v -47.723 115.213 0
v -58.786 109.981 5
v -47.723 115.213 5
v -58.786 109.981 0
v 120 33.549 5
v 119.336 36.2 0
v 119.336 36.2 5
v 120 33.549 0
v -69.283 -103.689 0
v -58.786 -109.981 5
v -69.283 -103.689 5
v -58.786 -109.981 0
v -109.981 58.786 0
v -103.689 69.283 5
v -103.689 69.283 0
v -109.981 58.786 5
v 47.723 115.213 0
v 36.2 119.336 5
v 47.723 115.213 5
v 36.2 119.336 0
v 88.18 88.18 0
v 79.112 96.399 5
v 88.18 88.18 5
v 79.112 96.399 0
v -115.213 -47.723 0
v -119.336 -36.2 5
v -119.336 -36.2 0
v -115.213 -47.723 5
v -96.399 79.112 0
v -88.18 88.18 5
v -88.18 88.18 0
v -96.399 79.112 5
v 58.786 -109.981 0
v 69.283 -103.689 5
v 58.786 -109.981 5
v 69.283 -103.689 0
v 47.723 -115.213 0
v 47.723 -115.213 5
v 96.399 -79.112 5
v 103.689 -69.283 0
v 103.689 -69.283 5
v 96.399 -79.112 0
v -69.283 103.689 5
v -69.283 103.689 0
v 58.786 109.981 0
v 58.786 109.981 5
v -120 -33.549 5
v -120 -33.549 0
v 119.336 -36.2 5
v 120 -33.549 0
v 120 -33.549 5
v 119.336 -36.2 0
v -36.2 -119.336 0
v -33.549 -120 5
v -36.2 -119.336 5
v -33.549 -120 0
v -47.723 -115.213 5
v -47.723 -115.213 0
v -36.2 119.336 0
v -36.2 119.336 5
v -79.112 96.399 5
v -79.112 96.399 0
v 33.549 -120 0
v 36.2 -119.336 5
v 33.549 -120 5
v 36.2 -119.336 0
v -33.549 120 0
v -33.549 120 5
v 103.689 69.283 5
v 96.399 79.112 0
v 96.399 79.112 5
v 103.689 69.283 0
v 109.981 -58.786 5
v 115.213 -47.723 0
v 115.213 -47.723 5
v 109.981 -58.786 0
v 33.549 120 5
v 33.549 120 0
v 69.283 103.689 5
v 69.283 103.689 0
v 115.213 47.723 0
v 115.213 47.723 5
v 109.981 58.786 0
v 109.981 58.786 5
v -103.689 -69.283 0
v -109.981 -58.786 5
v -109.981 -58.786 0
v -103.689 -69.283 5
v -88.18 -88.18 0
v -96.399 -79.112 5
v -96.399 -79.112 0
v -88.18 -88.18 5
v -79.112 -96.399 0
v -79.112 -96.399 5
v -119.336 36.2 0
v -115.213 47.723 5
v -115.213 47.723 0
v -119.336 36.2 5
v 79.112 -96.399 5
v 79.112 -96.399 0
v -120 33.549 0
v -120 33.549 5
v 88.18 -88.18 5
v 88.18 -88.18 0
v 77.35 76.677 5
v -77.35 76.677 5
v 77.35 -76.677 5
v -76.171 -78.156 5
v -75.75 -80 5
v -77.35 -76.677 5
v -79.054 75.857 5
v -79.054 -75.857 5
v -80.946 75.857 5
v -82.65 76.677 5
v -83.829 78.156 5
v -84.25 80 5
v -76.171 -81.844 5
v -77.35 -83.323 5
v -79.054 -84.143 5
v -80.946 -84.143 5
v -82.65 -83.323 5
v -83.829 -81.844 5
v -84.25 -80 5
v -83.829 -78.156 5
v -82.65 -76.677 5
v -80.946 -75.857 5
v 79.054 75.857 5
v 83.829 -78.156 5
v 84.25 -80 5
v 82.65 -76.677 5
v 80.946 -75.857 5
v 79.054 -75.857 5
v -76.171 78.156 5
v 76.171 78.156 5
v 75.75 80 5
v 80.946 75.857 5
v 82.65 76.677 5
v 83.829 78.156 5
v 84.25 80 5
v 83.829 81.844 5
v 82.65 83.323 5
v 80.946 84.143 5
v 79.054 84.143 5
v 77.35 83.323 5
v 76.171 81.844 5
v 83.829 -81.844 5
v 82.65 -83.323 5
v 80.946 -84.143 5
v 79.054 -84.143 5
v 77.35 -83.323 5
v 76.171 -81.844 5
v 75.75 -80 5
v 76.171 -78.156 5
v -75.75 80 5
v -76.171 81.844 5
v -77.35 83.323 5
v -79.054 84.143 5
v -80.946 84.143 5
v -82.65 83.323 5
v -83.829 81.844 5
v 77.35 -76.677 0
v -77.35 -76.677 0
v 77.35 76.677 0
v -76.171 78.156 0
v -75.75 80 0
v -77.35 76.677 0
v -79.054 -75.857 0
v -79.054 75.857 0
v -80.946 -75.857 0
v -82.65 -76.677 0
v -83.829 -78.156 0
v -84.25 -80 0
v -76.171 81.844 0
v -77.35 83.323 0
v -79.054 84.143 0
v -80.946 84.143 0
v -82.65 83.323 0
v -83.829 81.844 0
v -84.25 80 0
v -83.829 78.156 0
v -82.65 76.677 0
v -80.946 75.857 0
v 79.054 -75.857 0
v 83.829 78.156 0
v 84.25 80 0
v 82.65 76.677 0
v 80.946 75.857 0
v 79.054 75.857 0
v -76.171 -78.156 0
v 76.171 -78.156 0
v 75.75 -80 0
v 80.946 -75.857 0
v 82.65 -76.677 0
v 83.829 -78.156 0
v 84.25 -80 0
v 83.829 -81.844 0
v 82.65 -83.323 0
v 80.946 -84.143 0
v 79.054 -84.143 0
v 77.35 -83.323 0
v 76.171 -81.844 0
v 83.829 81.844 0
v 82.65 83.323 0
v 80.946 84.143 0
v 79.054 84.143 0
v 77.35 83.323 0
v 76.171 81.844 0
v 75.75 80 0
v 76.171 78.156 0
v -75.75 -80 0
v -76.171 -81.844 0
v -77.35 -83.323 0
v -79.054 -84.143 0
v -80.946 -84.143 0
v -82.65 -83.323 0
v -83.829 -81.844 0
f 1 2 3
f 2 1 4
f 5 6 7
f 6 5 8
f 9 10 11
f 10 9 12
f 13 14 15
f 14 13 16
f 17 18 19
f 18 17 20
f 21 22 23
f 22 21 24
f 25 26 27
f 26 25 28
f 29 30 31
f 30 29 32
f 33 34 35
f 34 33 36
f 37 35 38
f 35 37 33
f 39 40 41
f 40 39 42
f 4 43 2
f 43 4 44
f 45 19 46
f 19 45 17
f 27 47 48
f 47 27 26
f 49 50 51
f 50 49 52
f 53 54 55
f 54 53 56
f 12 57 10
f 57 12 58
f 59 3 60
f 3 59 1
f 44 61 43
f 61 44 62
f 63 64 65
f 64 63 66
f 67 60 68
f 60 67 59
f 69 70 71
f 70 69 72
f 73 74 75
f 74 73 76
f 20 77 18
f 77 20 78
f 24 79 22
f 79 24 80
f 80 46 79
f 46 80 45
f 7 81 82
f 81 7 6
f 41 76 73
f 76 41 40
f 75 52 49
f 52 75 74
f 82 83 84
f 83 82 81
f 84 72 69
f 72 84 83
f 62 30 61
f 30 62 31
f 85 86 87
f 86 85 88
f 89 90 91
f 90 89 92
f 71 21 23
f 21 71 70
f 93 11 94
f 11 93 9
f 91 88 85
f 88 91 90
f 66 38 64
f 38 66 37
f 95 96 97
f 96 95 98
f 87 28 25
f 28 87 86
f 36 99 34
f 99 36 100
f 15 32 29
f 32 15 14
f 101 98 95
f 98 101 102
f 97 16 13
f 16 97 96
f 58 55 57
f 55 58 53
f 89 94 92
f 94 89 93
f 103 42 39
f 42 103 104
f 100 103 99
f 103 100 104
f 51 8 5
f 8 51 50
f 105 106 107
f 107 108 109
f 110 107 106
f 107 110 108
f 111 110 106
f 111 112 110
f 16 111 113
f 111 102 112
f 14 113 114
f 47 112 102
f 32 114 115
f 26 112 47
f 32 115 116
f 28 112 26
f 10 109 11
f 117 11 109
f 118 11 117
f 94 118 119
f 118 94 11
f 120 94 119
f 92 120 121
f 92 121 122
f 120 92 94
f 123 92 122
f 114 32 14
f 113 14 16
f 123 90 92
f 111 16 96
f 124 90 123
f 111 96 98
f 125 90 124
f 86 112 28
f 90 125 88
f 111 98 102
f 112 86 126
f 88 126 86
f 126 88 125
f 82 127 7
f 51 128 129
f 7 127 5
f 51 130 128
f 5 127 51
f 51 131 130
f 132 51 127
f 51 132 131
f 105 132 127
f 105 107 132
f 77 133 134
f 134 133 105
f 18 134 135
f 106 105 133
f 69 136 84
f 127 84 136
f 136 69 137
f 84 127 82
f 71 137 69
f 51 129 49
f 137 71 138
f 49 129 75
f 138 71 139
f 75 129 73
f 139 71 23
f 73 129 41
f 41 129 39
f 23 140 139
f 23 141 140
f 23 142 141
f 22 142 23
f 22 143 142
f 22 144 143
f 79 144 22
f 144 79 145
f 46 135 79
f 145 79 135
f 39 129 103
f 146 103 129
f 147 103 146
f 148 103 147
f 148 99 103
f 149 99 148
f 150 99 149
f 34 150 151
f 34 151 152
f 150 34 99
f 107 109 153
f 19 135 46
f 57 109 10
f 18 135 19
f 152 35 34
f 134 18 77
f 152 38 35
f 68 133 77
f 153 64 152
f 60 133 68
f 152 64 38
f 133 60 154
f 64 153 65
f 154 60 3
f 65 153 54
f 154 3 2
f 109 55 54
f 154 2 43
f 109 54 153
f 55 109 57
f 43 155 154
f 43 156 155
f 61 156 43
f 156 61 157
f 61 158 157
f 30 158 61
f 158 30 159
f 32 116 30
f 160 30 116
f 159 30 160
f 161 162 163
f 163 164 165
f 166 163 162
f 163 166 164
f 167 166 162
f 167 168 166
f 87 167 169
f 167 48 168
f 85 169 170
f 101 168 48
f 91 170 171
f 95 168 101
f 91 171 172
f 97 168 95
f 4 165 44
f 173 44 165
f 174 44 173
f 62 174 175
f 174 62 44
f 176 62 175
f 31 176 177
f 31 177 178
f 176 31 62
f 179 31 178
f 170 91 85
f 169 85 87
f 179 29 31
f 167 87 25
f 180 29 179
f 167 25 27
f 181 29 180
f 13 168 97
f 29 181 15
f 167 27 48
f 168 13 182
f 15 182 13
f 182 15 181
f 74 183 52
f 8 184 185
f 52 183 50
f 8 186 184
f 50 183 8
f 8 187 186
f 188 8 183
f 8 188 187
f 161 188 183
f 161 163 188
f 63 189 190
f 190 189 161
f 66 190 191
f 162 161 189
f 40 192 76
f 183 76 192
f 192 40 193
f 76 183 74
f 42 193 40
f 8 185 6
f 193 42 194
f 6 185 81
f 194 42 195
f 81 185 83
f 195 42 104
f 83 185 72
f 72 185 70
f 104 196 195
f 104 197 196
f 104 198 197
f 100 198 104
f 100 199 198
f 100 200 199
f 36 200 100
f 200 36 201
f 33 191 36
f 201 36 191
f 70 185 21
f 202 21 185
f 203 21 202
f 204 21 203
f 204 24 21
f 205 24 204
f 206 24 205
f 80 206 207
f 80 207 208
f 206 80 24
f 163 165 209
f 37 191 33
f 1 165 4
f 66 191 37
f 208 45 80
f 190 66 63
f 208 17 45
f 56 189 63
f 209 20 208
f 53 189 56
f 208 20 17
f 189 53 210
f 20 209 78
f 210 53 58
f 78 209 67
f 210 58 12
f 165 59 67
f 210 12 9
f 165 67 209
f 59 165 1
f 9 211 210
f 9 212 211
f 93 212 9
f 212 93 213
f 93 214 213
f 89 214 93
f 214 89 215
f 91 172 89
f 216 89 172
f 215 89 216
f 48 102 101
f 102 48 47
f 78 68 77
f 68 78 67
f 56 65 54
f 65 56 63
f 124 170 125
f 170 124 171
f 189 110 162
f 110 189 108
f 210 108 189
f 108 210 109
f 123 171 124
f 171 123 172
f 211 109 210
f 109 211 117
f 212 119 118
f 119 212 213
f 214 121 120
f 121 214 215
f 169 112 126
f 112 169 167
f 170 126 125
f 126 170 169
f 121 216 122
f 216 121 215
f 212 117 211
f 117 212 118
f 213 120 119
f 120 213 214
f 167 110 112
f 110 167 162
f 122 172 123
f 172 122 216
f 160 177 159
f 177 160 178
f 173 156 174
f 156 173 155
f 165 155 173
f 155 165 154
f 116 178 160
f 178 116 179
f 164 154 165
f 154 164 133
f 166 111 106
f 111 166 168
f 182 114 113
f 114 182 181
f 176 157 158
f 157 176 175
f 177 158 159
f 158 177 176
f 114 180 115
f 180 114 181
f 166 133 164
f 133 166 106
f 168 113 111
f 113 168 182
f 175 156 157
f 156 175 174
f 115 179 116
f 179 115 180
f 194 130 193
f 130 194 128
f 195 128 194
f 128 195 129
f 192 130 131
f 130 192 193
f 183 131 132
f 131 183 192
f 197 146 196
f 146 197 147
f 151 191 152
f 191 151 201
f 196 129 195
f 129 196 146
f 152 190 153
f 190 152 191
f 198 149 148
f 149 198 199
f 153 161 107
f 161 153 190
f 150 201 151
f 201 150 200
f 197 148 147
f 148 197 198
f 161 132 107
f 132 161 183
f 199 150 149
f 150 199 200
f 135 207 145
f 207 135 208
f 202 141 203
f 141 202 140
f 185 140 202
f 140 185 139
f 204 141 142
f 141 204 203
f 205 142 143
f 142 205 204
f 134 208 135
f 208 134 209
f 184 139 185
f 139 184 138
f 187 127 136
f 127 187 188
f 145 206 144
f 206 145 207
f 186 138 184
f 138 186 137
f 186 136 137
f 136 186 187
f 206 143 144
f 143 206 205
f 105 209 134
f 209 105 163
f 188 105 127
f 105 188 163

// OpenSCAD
// file: samSCAD/samstdlib.scad
module bolt_circle(num_bolts, circle_radius, hole_diameter, hole_height) {
    for (i = [0:num_bolts-1]) {
        angle = i * 360 / num_bolts;
        x = circle_radius * cos(angle);
        y = circle_radius * sin(angle);
        translate([x, y, 0]) {
            cylinder(h = hole_height, d = hole_diameter);
        }
    }
}

module bolt_square(num_x, num_y, spacing_x, spacing_y, hole_diameter, hole_height) {
    for (i = [0:num_x-1])
        for (j = [0:num_y-1]) {
            x = (i - (num_x - 1) / 2) * spacing_x;
            y = (j - (num_y - 1) / 2) * spacing_y;
            translate([x, y, 0]) {
                cylinder(h = hole_height, d = hole_diameter);
            }
        }
}

// M1 Nut Trap (w = 2.3mm, h = 0.8mm)
module m1_nut_trap (w = 2.3, h = 0.81) {
    cylinder(r = w / 2 / cos(180 / 6) + 0.05, h = h, $fn = 6);
}

// M2 Nut Trap (w = 3.7mm, h = 1.6mm)
module m2_nut_trap (w = 3.7, h = 1.61) {
    cylinder(r = w / 2 / cos(180 / 6) + 0.05, h = h, $fn = 6);
}

// M3 Nut Trap (w = 4.3mm, h = 1.8mm)
module m3_nut_trap (w = 4.3, h = 1.81) {
    cylinder(r = w / 2 / cos(180 / 6) + 0.05, h = h, $fn = 6);
}

// M4 Nut Trap (w = 5.3mm, h = 2.2mm)
module m4_nut_trap (w = 5.3, h = 2.21) {
    cylinder(r = w / 2 / cos(180 / 6) + 0.05, h = h, $fn = 6);
}

// M5 Nut Trap (w = 6.4mm, h = 2.5mm)
module m5_nut_trap (w = 6.4, h = 2.51) {
    cylinder(r = w / 2 / cos(180 / 6) + 0.05, h = h, $fn = 6);
}

// M6 Nut Trap (w = 7.0mm, h = 2.8mm)
module m6_nut_trap (w = 7.0, h = 2.81) {
    cylinder(r = w / 2 / cos(180 / 6) + 0.05, h = h, $fn = 6);
}

// M7 Nut Trap (w = 8.0mm, h = 3.0mm)
module m7_nut_trap (w = 8.0, h = 3.01) {
    cylinder(r = w / 2 / cos(180 / 6) + 0.05, h = h, $fn = 6);
}

// M8 Nut Trap (w = 9.0mm, h = 3.5mm)
module m8_nut_trap (w = 9.0, h = 3.51) {
    cylinder(r = w / 2 / cos(180 / 6) + 0.05, h = h, $fn = 6);
}

// Nut Trap Circle for M1 to M8
module nut_trap_circle(n, r, nut_type = "m2") {
    for (i = [0 : n-1]) {
        angle = 360 / n * i;  // Angle for each nut trap
        x = r * cos(angle);   // X position
        y = r * sin(angle);   // Y position

        translate([x, y, 0]) {
            if (nut_type == "m1") {
                m1_nut_trap();
            } else if (nut_type == "m2") {
                m2_nut_trap();
            } else if (nut_type == "m3") {
                m3_nut_trap();
            } else if (nut_type == "m4") {
                m4_nut_trap();
            } else if (nut_type == "m5") {
                m5_nut_trap();
            } else if (nut_type == "m6") {
                m6_nut_trap();
            } else if (nut_type == "m7") {
                m7_nut_trap();
            } else if (nut_type == "m8") {
                m8_nut_trap();
            }
        }
    }
}

module hollow_cylinder(outer_d, inner_d, h, center = false, fn = 64) {
    difference() {
        cylinder(d = outer_d, h = h, center = center, $fn = fn);
        translate([0, 0, -1]) cylinder(d = inner_d, h = h + 2, center = center, $fn = fn); // +2 to avoid coplanar face errors
    }
}

module hollow_cuboid(w, h, d, wall_thickness) {
    difference() {
        cube([w, h, d]);
        
        cube([w - 2 * wall_thickness, h - 2 * wall_thickness, d - 2 * wall_thickness], true);
    }
}

module gear20dp(n_teeth, thickness=5, pressure_angle=20, bore=5) {
    pitch_diameter = n_teeth / 20;
    base_diameter = pitch_diameter * cos(pressure_angle);
    outer_diameter = (n_teeth + 2) / 20;
    root_diameter = (n_teeth - 2.5) / 20;  // tweakable

    $fn=100;

    difference() {
        union() {
            // gear body
            cylinder(h=thickness, d=outer_diameter);
            
            // crude approximation of teeth
            for (i = [0:n_teeth-1]) {
                angle = 360 * i / n_teeth;
                rotate([0,0,angle])
                    translate([pitch_diameter * PI / n_teeth, 0, 0])
                        cube([0.6 * pitch_diameter * PI / n_teeth, 1.5, thickness], center=true);
            }
        }
        // bore
        cylinder(h=thickness + 1, d=bore, center=true);
    }
}

module hollow_hex(outer_radius=20, wall_thickness=3, height=10) {
    difference() {
        linear_extrude(height)
            polygon(points=regular_ngon(6, outer_radius));
        linear_extrude(height + 2)
            polygon(points=regular_ngon(6, outer_radius - wall_thickness));
        translate([0, 0, -0.1]) {
            union() {
                linear_extrude(1) {
                    polygon(points=regular_ngon(6, outer_radius - wall_thickness));
                } 
            }
        }
    }
}


module hollow_hex_capped(outer_radius=20, wall_thickness=3, height=10, dr = outer_radius - 2, dt = wall_thickness - 1, dh = height - 3, diff_translate=[0, 0, 8]) {
    difference() {
        linear_extrude(height)
            polygon(points=regular_ngon(6, outer_radius));
        linear_extrude(height + 2)
            polygon(points=regular_ngon(6, outer_radius - wall_thickness));
        translate([0, 0, -0.1]) {
            union() {
                linear_extrude(1) {
                    polygon(points=regular_ngon(6, outer_radius - wall_thickness));
                } 
            }
        }
    }
}

// helper function to make a regular N-gon
function regular_ngon(n, r) = 
    [ for (i = [0 : n-1]) 
        [ r*cos(360*i/n), r*sin(360*i/n) ] ];

// hex_shaft(hex_d, length)
// hex_d: flat-to-flat width of the hex
// length: length of the shaft along the Z axis

module hex_shaft(hex_d = 6, length = 100) {
    // calculate radius from center to vertex
    hex_radius = hex_d / cos(30);  // 30 degrees in radians = π/6, cos(π/6) = sqrt(3)/2

    linear_extrude(height = length, center = true)
        polygon(points = [
            for (i = [0 : 5])
                [hex_radius * cos(i * 60), hex_radius * sin(i * 60)]
        ]);
}

module ramp(width=10, height=5, depth=5) {
    polygon(points=[[0,0], [width,0], [0,height]]);
    
    linear_extrude(height=depth)
        polygon(points=[[0,0], [width,0], [0,height]]);
}
// main file
use <samSCAD/samstdlib.scad>

// base plate dimensions
base_plate_square = 240;
base_plate_height = 5;

circumscribed_diameter = sqrt(2) * base_plate_square;

// to be diffed, outer 4 m10 bolts.
module base_plate_outer_bolt_square_DIFF() {
	union() {
		translate([0, 0, -10 / 2 + 1]) {
			bolt_square(num_x = 2, num_y = 2, spacing_x = 160, spacing_y = 160, hole_diameter = 8.5, hole_height = 10);
		}
	}
}

module base_plate_raw() {
	union() {
	difference() {
			translate([0, 0, base_plate_height / 2]) {
				cube([base_plate_square, base_plate_square, base_plate_height], center = true);
			}
			translate([0, 0, (10 / 2) - 0.1]) {
				hollow_cylinder(
					outer_d = circumscribed_diameter,
					inner_d = circumscribed_diameter - 90,
					h = 10, 
					center = true,
					$fn = 150
				);
			}
		}
	}
}

// solid plate with 4 bolt m10x1.5 bolt holes. 
// maybe i'll make a version with a nut trap in the top.
module base_plate() {
	union() {
		difference() {
			base_plate_raw();

			base_plate_outer_bolt_square_DIFF();
		}
	}
}

base_plate();
